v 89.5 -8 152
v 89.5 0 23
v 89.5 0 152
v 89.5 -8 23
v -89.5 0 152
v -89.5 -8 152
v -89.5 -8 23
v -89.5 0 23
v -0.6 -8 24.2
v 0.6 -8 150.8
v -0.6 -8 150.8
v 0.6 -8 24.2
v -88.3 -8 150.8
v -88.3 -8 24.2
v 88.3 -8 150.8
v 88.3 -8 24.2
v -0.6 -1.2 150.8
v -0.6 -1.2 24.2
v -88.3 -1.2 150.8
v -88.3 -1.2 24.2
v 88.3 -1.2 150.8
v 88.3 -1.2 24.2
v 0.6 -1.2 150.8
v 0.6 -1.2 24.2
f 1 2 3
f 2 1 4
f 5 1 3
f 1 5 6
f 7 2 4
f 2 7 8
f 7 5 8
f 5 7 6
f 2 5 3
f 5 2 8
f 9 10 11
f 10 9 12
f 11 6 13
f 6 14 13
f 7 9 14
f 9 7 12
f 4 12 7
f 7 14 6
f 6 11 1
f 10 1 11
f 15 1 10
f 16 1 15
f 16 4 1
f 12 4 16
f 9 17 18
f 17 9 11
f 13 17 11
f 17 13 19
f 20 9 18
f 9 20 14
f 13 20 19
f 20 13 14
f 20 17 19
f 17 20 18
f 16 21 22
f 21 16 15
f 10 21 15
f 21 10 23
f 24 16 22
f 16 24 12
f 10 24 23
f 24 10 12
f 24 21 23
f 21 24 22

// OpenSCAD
//font="Bitstream Vera Sans Bold";
//font="Arial Black";
font="Baskerville:style=Bold";
text_on_flat="Siostrzyczki";
//text_on_flat="SIOSTRZYCZKI";
text_size=35;
depth=40;
spacing=0.89;

frame_z_offset = 0.5*text_size;

frame_width=10;
frame_depth=20;
frame_cover_overlap=frame_width*0.5;
picture_overlap=frame_width-frame_cover_overlap;

picture_x=180;
picture_z=130;
picture_depth=0.5*frame_depth;

cover_spacing=0.5;
cover_wall_width=1.2;
cover_depth_multiplier=0.8;



module the_text() {
linear_extrude(height=depth, convexity=4)
    text(text_on_flat, 
         size=text_size,
         font=font,
         halign="center",
         spacing=spacing);
}

module picture_frame() {
    frame_size_x = picture_x - 2*picture_overlap + 2*frame_width;
    frame_size_z = picture_z - 2*picture_overlap + 2*frame_width;
    window_size_x = picture_x - 2*picture_overlap;
    window_size_z = picture_z - 2*picture_overlap;
    translate([-0.5*frame_size_x, 0, 0]) difference() {
        cube([frame_size_x, frame_depth, frame_size_z]);
        translate([frame_width, 0, frame_width]) cube([window_size_x, frame_depth, window_size_z]);
    }    
}

module base_frame_with_text() {
  rotate([90, 0, 0]) the_text();
  translate([0, -frame_depth, frame_z_offset]) picture_frame();
}

module picture_cut() {
  real_picture_depth=frame_depth-picture_depth;
  translate([-0.5*picture_x, -real_picture_depth, frame_z_offset+frame_width-picture_overlap]) cube([picture_x, real_picture_depth, picture_z]);
}


module the_frame() {
    difference() {
      base_frame_with_text();
      picture_cut();
    }
}

module cover() {
  real_cover_depth=cover_depth_multiplier*(frame_depth-picture_depth);
  cover_x = picture_x-2*cover_spacing;
  cover_z = picture_z-2*cover_spacing;
  cut_x = 0.5*(cover_x-3*cover_wall_width);
  cut_z = cover_z-2*cover_wall_width;
  cut_y = real_cover_depth-cover_wall_width;
  
  translate([-0.5*cover_x, -real_cover_depth, frame_z_offset+frame_width-picture_overlap+cover_spacing]) 
    difference() {
      cube([cover_x, real_cover_depth, cover_z]);
      translate([cover_wall_width, 0, cover_wall_width]) cube([cut_x, cut_y, cut_z]);
      translate([cut_x+2*cover_wall_width, 0, cover_wall_width]) cube([cut_x, cut_y, cut_z]);
    }
}

module support() {
    frame_size_x = picture_x - 2*picture_overlap + 2*frame_width;
    support_width=5;
    support_height=5;
    z_offset = support_height+7;
    translate([-0.5*frame_size_x, -depth, -z_offset]) 
    {
        cube([frame_size_x, depth, support_height]);
        translate([0, depth-support_width, support_height]) cube([frame_size_x, support_width, z_offset-support_height]);
    }
        
}

//the_frame();
//support();
cover();
